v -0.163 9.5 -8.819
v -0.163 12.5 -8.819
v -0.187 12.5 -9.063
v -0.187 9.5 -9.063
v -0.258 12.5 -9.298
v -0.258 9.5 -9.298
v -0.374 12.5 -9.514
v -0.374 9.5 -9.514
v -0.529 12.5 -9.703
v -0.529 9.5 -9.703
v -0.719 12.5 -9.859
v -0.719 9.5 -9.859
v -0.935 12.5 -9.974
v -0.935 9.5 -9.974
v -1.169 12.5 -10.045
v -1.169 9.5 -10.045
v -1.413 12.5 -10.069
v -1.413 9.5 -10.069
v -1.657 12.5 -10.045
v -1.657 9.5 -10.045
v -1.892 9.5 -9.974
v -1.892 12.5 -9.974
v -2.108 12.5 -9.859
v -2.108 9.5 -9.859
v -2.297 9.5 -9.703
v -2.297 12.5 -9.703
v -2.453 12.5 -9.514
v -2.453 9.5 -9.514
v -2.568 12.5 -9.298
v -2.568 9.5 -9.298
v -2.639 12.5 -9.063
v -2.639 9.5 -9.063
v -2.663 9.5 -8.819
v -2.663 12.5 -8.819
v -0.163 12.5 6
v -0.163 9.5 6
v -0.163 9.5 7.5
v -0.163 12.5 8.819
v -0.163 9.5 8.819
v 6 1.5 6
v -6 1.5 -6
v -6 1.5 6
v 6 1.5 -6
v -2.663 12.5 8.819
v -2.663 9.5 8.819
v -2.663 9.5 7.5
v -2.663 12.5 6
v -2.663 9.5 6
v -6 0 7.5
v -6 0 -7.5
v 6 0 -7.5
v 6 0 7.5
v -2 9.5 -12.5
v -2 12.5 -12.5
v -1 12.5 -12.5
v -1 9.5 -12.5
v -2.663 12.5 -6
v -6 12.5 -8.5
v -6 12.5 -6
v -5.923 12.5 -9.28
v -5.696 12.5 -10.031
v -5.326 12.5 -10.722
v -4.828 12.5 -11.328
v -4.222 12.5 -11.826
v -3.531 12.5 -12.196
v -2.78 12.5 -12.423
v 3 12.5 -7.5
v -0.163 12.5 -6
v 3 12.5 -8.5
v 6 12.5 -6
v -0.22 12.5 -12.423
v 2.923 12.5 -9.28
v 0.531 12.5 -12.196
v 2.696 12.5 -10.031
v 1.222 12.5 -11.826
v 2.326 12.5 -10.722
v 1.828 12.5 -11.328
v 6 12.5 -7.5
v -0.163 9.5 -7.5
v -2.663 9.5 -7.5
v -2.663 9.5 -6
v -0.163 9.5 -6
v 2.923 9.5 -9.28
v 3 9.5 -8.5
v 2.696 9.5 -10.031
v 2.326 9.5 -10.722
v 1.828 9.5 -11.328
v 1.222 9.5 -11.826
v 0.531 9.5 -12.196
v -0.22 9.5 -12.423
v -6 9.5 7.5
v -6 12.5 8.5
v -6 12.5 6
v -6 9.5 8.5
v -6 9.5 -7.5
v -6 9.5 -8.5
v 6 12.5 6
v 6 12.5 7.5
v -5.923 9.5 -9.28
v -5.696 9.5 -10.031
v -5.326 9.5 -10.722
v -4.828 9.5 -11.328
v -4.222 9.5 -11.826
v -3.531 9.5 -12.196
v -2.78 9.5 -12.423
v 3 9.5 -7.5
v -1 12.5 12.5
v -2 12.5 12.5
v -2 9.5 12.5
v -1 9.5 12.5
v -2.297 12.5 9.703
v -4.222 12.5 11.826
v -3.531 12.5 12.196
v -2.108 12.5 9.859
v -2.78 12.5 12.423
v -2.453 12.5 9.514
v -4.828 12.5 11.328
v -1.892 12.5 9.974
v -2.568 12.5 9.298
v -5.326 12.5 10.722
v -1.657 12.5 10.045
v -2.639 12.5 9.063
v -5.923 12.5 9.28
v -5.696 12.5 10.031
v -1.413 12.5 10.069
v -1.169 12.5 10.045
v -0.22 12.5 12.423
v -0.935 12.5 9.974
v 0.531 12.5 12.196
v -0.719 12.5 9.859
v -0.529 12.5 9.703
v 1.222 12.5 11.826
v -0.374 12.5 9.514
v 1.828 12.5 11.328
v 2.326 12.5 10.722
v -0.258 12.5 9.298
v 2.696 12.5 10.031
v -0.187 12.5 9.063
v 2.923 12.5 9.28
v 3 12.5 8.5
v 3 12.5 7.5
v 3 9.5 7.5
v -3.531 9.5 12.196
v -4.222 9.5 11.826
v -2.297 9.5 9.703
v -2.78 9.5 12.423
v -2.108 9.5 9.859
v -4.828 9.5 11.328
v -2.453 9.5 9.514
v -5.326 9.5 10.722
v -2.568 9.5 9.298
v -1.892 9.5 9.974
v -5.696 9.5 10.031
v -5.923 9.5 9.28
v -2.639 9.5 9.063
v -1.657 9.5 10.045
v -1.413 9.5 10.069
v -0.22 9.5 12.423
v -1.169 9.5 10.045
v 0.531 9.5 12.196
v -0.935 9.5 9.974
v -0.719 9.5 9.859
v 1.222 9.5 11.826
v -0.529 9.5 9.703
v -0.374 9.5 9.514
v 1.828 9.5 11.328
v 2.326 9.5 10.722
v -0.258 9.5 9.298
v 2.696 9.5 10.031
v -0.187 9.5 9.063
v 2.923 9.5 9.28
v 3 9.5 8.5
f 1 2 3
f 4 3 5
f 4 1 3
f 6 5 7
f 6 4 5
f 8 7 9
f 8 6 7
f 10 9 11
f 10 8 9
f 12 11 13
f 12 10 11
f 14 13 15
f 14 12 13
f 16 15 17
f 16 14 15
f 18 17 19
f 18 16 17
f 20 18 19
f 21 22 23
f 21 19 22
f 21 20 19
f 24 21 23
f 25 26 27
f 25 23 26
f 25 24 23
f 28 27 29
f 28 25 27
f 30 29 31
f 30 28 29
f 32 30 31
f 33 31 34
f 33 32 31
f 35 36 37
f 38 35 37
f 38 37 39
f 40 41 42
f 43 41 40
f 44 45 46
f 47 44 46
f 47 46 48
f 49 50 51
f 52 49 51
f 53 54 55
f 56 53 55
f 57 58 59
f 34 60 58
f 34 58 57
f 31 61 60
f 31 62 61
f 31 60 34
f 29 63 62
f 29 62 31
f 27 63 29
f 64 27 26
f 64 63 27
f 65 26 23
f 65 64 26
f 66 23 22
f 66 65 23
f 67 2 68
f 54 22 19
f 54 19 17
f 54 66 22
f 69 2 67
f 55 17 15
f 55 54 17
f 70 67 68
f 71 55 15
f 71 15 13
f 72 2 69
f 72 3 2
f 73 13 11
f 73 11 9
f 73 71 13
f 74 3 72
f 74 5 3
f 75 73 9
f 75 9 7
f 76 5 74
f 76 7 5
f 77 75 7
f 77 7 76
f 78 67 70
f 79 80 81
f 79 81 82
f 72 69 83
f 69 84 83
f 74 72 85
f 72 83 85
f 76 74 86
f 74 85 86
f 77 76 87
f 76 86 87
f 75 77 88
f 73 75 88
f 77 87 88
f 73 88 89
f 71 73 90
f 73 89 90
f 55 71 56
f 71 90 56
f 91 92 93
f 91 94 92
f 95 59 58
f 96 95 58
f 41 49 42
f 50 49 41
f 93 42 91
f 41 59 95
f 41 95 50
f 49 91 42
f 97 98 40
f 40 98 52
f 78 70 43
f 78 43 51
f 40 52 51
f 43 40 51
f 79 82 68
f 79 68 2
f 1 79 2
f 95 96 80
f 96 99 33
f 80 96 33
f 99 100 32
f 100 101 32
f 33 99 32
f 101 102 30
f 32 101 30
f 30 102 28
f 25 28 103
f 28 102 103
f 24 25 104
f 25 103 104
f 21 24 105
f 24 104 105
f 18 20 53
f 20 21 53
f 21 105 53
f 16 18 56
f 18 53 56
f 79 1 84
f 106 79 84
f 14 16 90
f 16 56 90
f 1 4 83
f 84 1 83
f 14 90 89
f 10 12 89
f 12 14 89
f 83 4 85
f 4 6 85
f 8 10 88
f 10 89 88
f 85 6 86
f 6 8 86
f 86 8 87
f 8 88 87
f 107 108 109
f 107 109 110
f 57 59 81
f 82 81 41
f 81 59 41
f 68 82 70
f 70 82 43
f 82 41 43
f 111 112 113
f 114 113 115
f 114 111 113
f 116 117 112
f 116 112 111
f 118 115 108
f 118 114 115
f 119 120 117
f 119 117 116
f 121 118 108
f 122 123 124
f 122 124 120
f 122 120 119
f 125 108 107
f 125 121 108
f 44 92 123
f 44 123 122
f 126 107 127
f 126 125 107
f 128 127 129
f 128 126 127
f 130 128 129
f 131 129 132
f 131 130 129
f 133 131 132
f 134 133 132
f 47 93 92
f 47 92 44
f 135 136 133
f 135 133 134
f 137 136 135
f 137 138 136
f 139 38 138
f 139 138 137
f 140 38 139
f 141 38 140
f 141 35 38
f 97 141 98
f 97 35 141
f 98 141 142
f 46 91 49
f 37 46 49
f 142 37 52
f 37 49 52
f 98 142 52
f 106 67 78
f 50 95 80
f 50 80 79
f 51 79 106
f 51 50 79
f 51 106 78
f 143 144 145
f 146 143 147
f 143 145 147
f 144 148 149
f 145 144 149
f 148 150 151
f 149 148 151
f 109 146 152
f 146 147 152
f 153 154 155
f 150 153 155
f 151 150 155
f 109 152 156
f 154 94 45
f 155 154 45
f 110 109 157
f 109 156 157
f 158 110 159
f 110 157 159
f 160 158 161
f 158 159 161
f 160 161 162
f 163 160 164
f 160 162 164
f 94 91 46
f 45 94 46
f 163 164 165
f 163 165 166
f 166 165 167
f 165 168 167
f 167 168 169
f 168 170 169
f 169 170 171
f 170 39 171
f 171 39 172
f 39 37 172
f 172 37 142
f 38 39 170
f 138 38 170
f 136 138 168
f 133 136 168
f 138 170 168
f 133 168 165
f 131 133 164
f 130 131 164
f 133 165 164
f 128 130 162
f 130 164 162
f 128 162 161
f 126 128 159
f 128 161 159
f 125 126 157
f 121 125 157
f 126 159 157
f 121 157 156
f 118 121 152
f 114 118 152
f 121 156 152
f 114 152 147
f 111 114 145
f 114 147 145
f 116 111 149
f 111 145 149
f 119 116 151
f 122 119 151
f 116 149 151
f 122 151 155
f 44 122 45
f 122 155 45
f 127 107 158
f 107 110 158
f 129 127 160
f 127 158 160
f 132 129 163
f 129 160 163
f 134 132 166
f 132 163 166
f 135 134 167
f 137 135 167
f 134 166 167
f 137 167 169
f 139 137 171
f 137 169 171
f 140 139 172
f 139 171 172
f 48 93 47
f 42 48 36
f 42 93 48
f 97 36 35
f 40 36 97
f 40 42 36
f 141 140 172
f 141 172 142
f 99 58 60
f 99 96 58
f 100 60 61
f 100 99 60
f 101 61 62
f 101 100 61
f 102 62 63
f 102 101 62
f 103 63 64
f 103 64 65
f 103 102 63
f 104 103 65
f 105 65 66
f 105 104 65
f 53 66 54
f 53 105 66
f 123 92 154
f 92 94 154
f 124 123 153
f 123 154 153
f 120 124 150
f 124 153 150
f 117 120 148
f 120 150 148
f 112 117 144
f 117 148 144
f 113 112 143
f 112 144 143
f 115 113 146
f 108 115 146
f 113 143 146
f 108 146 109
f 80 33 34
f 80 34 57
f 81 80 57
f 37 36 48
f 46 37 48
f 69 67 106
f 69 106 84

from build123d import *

# Parameters (mm, degrees)
SKETCH_1_W               = 12
SKETCH_1_H               = 15
EXTRUDE_1_DEPTH          = 1.5
SKETCH_2_W               = 12
SKETCH_2_H               = 1.5
EXTRUDE_2_DEPTH          = 11
SKETCH_3_W               = 9
SKETCH_3_H               = 6.5
EXTRUDE_3_DEPTH          = 3
FILLET_1_R               = 4
CUT_EXTRUDE_1_DEPTH      = 19.668154703
CUT_EXTRUDE_1_DEPTH_BACK = 3
FILLET_2_R               = 4


with BuildPart() as part:
    # 草图1 → 凸台-拉伸1 (new body)
    with BuildSketch(Plane(origin=(0, 0, 0), x_dir=(1, 0, 0), z_dir=(0, 1, 0))):
        Rectangle(SKETCH_1_W, SKETCH_1_H)
    extrude(amount=EXTRUDE_1_DEPTH)

    # 草图2 → 凸台-拉伸2 (add)
    with BuildSketch(Plane(origin=(0, 1.5, 0), x_dir=(1, 0, 0), z_dir=(0, 1, 0))):
        with Locations((0, 6.75)):
            Rectangle(SKETCH_2_W, SKETCH_2_H)
        with Locations((0, -6.75)):
            Rectangle(SKETCH_2_W, SKETCH_2_H)
    extrude(amount=EXTRUDE_2_DEPTH)

    # 草图3 → 凸台-拉伸3 (add)
    with BuildSketch(Plane(origin=(0, 12.5, 0), x_dir=(1, 0, 0), z_dir=(0, 1, 0))):
        with Locations((-1.5, 9.25)):
            Rectangle(SKETCH_3_W, SKETCH_3_H)
        with Locations((-1.5, -9.25)):
            Rectangle(SKETCH_3_W, SKETCH_3_H)
    extrude(amount=-EXTRUDE_3_DEPTH)

    # 圆角1
    fillet_1_edges = [part.edges().sort_by_distance(p)[0] for p in [
        (3, 11, -12.5),
        (-6, 11, -12.5),
    ]]
    fillet(fillet_1_edges, radius=FILLET_1_R)

    # 草图4 → 切除-拉伸1 (cut, two sides: drawn at the far end of the back side and taken through both)
    with BuildSketch(Plane(origin=(0, 12.5, 0), x_dir=(1, 0, 0), z_dir=(0, 1, 0)).offset(-CUT_EXTRUDE_1_DEPTH_BACK)):
        with BuildLine():
            Line((-2.66316567, 8.819250258), (-2.66316567, 6))
            Line((-2.66316567, 6), (-0.16316567, 6))
            Line((-0.16316567, 6), (-0.16316567, 8.819250258))
            ThreePointArc((-0.16316567, 8.819250258), (-1.41316567, 10.069250258), (-2.66316567, 8.819250258))
        make_face()
        with BuildLine():
            Line((-0.16316567, -6), (-0.16316567, -8.819250258))
            ThreePointArc((-0.16316567, -8.819250258), (-1.41316567, -10.069250258), (-2.66316567, -8.819250258))
            Line((-2.66316567, -8.819250258), (-2.66316567, -6))
            Line((-2.66316567, -6), (-0.16316567, -6))
        make_face()
    extrude(amount=CUT_EXTRUDE_1_DEPTH + CUT_EXTRUDE_1_DEPTH_BACK, mode=Mode.SUBTRACT)

    # 圆角2
    fillet_2_edges = [part.edges().sort_by_distance(p)[0] for p in [
        (-6, 11, 12.5),
        (3, 11, 12.5),
    ]]
    fillet(fillet_2_edges, radius=FILLET_2_R)


solid = part.part
